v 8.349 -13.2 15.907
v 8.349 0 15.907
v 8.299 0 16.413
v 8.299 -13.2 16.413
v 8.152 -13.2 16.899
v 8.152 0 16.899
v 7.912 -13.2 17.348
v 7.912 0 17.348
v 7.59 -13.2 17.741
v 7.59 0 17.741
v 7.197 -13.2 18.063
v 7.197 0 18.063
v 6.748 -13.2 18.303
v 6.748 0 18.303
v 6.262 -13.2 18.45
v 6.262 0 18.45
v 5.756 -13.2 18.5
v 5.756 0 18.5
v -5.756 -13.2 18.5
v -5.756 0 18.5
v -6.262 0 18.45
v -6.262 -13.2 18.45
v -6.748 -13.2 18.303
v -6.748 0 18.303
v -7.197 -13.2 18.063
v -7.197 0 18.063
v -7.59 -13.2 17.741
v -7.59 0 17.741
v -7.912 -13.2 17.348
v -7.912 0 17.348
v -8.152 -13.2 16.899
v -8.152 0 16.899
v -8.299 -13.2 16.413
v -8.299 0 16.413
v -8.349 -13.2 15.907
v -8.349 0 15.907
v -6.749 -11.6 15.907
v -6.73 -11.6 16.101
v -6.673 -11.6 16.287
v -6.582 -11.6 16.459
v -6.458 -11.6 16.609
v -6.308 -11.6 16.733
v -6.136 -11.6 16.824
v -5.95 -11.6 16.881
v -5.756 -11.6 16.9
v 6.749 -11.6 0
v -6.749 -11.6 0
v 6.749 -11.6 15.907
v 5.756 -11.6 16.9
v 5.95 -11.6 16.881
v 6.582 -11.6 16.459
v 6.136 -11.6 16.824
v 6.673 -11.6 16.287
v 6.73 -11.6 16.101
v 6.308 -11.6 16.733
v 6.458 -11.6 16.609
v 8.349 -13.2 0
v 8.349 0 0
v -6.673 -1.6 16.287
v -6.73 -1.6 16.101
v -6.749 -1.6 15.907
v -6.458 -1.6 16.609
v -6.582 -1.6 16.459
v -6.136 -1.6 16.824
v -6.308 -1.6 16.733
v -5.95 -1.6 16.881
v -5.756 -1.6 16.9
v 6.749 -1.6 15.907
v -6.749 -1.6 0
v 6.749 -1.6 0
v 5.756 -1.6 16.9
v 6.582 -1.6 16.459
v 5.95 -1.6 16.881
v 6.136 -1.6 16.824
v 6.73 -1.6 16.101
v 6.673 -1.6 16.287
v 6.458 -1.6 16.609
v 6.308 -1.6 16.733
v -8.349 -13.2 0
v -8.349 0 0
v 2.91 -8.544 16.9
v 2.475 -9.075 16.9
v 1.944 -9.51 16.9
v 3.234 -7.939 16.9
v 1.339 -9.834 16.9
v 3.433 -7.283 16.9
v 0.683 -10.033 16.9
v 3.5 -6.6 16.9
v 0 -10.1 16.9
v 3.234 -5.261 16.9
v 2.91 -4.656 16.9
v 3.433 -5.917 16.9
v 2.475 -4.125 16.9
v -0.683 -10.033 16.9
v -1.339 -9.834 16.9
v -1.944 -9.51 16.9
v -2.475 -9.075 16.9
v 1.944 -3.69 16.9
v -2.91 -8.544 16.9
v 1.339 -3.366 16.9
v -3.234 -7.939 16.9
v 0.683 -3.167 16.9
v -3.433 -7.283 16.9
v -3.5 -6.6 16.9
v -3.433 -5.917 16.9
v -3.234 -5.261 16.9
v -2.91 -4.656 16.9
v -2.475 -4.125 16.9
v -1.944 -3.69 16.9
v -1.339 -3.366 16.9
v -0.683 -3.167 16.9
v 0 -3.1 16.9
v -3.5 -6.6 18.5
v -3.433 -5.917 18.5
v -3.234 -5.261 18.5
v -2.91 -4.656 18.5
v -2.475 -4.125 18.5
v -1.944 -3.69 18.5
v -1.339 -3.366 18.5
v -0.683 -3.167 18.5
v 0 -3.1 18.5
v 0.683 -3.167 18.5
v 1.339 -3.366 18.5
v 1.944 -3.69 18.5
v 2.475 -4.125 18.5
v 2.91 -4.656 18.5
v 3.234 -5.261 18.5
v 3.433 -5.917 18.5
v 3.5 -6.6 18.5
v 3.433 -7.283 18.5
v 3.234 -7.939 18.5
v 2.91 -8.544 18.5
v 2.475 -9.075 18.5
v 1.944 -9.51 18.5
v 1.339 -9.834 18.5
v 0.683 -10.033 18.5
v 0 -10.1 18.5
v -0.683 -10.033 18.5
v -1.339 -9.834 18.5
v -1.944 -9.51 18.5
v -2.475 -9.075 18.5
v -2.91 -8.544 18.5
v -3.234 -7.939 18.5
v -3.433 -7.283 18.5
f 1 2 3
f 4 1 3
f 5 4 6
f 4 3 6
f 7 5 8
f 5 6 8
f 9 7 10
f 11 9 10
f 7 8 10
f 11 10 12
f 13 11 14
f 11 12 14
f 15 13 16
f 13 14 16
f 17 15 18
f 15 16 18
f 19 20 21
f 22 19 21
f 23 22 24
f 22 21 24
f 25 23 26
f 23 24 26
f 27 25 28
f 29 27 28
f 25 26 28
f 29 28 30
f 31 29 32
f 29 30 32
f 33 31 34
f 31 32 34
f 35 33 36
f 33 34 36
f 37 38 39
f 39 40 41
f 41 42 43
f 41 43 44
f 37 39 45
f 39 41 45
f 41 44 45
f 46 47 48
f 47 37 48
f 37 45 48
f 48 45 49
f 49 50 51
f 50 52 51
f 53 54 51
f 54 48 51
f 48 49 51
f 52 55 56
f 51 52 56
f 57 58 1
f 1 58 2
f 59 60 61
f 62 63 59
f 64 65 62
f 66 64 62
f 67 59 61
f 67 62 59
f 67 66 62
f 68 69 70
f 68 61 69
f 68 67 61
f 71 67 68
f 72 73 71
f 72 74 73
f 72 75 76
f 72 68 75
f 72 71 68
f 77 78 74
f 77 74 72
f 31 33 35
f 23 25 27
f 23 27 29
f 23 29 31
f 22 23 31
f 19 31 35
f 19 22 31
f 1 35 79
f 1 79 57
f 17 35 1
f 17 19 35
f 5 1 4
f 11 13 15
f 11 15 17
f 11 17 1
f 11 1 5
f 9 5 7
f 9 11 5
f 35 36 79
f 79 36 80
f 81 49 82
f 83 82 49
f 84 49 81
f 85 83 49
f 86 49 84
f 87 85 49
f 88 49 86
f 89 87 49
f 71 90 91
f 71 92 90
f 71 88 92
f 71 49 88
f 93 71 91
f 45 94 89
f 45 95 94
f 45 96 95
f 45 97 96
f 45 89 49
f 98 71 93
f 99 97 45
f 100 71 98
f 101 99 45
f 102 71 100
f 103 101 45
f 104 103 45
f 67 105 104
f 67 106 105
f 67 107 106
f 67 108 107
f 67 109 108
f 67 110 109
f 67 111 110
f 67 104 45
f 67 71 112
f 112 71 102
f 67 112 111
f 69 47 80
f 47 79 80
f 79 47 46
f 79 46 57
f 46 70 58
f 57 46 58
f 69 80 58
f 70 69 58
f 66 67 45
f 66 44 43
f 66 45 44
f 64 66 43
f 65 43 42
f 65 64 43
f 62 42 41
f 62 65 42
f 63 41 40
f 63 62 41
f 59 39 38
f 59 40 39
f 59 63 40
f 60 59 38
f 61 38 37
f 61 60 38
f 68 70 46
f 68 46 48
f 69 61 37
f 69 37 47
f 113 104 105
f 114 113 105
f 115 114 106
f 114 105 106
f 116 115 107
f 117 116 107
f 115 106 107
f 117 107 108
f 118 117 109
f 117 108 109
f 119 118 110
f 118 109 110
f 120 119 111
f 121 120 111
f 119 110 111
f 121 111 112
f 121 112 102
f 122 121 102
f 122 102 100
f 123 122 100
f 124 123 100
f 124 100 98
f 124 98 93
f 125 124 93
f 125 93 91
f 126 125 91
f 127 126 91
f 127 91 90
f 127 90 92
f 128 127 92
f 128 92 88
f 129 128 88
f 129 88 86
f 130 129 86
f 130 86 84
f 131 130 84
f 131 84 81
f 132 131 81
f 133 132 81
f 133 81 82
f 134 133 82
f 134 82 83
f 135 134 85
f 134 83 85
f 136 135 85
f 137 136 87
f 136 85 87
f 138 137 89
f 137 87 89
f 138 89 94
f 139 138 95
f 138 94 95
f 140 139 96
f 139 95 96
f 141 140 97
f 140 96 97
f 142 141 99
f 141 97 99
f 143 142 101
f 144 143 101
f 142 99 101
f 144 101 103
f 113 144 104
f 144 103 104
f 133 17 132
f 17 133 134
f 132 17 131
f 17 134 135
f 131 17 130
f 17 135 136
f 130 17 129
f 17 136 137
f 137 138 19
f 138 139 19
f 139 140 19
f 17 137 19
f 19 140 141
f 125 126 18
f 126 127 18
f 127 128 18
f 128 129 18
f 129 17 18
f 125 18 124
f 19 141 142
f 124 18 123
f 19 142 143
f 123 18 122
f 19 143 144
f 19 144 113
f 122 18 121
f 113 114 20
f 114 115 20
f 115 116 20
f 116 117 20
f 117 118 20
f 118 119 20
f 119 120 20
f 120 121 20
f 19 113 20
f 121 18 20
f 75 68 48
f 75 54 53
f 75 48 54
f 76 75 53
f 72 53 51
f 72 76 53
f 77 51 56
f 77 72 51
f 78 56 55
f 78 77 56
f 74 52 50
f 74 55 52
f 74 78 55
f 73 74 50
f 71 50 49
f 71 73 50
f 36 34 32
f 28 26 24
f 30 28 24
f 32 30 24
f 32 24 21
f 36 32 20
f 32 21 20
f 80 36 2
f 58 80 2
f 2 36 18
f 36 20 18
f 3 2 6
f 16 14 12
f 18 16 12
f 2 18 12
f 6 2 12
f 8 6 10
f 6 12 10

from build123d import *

# Parameters (mm, degrees)
F1_DEPTH = 13.2
F2_T     = -1.6
F4_D     = 7


with BuildPart() as f1:
    # F0 (on Front) → F1 (new body)
    with BuildSketch(Plane.XZ):
        with BuildLine():
            Line((-8.349, 15.907), (-8.349, 0))
            Line((-8.349, 0), (8.349, 0))
            Line((8.349, 0), (8.349, 15.907))
            ThreePointArc((8.349, 15.907), (7.5895278836, 17.7405278836), (5.756, 18.5))
            Line((5.756, 18.5), (-5.756, 18.5))
            ThreePointArc((-5.756, 18.5), (-7.5895278836, 17.7405278836), (-8.349, 15.907))
        make_face()
    extrude(amount=F1_DEPTH)

    # F2
    f2_openings = [f1.faces().sort_by_distance(p)[0] for p in [
        (0, -6.6, 0),
    ]]
    offset(amount=F2_T, openings=f2_openings)

    # F4 (through all)
    with Locations(Plane.XY.offset(18.5)):
        with Locations((0, -6.6)):
            Hole(F4_D / 2)


solid = f1.part
